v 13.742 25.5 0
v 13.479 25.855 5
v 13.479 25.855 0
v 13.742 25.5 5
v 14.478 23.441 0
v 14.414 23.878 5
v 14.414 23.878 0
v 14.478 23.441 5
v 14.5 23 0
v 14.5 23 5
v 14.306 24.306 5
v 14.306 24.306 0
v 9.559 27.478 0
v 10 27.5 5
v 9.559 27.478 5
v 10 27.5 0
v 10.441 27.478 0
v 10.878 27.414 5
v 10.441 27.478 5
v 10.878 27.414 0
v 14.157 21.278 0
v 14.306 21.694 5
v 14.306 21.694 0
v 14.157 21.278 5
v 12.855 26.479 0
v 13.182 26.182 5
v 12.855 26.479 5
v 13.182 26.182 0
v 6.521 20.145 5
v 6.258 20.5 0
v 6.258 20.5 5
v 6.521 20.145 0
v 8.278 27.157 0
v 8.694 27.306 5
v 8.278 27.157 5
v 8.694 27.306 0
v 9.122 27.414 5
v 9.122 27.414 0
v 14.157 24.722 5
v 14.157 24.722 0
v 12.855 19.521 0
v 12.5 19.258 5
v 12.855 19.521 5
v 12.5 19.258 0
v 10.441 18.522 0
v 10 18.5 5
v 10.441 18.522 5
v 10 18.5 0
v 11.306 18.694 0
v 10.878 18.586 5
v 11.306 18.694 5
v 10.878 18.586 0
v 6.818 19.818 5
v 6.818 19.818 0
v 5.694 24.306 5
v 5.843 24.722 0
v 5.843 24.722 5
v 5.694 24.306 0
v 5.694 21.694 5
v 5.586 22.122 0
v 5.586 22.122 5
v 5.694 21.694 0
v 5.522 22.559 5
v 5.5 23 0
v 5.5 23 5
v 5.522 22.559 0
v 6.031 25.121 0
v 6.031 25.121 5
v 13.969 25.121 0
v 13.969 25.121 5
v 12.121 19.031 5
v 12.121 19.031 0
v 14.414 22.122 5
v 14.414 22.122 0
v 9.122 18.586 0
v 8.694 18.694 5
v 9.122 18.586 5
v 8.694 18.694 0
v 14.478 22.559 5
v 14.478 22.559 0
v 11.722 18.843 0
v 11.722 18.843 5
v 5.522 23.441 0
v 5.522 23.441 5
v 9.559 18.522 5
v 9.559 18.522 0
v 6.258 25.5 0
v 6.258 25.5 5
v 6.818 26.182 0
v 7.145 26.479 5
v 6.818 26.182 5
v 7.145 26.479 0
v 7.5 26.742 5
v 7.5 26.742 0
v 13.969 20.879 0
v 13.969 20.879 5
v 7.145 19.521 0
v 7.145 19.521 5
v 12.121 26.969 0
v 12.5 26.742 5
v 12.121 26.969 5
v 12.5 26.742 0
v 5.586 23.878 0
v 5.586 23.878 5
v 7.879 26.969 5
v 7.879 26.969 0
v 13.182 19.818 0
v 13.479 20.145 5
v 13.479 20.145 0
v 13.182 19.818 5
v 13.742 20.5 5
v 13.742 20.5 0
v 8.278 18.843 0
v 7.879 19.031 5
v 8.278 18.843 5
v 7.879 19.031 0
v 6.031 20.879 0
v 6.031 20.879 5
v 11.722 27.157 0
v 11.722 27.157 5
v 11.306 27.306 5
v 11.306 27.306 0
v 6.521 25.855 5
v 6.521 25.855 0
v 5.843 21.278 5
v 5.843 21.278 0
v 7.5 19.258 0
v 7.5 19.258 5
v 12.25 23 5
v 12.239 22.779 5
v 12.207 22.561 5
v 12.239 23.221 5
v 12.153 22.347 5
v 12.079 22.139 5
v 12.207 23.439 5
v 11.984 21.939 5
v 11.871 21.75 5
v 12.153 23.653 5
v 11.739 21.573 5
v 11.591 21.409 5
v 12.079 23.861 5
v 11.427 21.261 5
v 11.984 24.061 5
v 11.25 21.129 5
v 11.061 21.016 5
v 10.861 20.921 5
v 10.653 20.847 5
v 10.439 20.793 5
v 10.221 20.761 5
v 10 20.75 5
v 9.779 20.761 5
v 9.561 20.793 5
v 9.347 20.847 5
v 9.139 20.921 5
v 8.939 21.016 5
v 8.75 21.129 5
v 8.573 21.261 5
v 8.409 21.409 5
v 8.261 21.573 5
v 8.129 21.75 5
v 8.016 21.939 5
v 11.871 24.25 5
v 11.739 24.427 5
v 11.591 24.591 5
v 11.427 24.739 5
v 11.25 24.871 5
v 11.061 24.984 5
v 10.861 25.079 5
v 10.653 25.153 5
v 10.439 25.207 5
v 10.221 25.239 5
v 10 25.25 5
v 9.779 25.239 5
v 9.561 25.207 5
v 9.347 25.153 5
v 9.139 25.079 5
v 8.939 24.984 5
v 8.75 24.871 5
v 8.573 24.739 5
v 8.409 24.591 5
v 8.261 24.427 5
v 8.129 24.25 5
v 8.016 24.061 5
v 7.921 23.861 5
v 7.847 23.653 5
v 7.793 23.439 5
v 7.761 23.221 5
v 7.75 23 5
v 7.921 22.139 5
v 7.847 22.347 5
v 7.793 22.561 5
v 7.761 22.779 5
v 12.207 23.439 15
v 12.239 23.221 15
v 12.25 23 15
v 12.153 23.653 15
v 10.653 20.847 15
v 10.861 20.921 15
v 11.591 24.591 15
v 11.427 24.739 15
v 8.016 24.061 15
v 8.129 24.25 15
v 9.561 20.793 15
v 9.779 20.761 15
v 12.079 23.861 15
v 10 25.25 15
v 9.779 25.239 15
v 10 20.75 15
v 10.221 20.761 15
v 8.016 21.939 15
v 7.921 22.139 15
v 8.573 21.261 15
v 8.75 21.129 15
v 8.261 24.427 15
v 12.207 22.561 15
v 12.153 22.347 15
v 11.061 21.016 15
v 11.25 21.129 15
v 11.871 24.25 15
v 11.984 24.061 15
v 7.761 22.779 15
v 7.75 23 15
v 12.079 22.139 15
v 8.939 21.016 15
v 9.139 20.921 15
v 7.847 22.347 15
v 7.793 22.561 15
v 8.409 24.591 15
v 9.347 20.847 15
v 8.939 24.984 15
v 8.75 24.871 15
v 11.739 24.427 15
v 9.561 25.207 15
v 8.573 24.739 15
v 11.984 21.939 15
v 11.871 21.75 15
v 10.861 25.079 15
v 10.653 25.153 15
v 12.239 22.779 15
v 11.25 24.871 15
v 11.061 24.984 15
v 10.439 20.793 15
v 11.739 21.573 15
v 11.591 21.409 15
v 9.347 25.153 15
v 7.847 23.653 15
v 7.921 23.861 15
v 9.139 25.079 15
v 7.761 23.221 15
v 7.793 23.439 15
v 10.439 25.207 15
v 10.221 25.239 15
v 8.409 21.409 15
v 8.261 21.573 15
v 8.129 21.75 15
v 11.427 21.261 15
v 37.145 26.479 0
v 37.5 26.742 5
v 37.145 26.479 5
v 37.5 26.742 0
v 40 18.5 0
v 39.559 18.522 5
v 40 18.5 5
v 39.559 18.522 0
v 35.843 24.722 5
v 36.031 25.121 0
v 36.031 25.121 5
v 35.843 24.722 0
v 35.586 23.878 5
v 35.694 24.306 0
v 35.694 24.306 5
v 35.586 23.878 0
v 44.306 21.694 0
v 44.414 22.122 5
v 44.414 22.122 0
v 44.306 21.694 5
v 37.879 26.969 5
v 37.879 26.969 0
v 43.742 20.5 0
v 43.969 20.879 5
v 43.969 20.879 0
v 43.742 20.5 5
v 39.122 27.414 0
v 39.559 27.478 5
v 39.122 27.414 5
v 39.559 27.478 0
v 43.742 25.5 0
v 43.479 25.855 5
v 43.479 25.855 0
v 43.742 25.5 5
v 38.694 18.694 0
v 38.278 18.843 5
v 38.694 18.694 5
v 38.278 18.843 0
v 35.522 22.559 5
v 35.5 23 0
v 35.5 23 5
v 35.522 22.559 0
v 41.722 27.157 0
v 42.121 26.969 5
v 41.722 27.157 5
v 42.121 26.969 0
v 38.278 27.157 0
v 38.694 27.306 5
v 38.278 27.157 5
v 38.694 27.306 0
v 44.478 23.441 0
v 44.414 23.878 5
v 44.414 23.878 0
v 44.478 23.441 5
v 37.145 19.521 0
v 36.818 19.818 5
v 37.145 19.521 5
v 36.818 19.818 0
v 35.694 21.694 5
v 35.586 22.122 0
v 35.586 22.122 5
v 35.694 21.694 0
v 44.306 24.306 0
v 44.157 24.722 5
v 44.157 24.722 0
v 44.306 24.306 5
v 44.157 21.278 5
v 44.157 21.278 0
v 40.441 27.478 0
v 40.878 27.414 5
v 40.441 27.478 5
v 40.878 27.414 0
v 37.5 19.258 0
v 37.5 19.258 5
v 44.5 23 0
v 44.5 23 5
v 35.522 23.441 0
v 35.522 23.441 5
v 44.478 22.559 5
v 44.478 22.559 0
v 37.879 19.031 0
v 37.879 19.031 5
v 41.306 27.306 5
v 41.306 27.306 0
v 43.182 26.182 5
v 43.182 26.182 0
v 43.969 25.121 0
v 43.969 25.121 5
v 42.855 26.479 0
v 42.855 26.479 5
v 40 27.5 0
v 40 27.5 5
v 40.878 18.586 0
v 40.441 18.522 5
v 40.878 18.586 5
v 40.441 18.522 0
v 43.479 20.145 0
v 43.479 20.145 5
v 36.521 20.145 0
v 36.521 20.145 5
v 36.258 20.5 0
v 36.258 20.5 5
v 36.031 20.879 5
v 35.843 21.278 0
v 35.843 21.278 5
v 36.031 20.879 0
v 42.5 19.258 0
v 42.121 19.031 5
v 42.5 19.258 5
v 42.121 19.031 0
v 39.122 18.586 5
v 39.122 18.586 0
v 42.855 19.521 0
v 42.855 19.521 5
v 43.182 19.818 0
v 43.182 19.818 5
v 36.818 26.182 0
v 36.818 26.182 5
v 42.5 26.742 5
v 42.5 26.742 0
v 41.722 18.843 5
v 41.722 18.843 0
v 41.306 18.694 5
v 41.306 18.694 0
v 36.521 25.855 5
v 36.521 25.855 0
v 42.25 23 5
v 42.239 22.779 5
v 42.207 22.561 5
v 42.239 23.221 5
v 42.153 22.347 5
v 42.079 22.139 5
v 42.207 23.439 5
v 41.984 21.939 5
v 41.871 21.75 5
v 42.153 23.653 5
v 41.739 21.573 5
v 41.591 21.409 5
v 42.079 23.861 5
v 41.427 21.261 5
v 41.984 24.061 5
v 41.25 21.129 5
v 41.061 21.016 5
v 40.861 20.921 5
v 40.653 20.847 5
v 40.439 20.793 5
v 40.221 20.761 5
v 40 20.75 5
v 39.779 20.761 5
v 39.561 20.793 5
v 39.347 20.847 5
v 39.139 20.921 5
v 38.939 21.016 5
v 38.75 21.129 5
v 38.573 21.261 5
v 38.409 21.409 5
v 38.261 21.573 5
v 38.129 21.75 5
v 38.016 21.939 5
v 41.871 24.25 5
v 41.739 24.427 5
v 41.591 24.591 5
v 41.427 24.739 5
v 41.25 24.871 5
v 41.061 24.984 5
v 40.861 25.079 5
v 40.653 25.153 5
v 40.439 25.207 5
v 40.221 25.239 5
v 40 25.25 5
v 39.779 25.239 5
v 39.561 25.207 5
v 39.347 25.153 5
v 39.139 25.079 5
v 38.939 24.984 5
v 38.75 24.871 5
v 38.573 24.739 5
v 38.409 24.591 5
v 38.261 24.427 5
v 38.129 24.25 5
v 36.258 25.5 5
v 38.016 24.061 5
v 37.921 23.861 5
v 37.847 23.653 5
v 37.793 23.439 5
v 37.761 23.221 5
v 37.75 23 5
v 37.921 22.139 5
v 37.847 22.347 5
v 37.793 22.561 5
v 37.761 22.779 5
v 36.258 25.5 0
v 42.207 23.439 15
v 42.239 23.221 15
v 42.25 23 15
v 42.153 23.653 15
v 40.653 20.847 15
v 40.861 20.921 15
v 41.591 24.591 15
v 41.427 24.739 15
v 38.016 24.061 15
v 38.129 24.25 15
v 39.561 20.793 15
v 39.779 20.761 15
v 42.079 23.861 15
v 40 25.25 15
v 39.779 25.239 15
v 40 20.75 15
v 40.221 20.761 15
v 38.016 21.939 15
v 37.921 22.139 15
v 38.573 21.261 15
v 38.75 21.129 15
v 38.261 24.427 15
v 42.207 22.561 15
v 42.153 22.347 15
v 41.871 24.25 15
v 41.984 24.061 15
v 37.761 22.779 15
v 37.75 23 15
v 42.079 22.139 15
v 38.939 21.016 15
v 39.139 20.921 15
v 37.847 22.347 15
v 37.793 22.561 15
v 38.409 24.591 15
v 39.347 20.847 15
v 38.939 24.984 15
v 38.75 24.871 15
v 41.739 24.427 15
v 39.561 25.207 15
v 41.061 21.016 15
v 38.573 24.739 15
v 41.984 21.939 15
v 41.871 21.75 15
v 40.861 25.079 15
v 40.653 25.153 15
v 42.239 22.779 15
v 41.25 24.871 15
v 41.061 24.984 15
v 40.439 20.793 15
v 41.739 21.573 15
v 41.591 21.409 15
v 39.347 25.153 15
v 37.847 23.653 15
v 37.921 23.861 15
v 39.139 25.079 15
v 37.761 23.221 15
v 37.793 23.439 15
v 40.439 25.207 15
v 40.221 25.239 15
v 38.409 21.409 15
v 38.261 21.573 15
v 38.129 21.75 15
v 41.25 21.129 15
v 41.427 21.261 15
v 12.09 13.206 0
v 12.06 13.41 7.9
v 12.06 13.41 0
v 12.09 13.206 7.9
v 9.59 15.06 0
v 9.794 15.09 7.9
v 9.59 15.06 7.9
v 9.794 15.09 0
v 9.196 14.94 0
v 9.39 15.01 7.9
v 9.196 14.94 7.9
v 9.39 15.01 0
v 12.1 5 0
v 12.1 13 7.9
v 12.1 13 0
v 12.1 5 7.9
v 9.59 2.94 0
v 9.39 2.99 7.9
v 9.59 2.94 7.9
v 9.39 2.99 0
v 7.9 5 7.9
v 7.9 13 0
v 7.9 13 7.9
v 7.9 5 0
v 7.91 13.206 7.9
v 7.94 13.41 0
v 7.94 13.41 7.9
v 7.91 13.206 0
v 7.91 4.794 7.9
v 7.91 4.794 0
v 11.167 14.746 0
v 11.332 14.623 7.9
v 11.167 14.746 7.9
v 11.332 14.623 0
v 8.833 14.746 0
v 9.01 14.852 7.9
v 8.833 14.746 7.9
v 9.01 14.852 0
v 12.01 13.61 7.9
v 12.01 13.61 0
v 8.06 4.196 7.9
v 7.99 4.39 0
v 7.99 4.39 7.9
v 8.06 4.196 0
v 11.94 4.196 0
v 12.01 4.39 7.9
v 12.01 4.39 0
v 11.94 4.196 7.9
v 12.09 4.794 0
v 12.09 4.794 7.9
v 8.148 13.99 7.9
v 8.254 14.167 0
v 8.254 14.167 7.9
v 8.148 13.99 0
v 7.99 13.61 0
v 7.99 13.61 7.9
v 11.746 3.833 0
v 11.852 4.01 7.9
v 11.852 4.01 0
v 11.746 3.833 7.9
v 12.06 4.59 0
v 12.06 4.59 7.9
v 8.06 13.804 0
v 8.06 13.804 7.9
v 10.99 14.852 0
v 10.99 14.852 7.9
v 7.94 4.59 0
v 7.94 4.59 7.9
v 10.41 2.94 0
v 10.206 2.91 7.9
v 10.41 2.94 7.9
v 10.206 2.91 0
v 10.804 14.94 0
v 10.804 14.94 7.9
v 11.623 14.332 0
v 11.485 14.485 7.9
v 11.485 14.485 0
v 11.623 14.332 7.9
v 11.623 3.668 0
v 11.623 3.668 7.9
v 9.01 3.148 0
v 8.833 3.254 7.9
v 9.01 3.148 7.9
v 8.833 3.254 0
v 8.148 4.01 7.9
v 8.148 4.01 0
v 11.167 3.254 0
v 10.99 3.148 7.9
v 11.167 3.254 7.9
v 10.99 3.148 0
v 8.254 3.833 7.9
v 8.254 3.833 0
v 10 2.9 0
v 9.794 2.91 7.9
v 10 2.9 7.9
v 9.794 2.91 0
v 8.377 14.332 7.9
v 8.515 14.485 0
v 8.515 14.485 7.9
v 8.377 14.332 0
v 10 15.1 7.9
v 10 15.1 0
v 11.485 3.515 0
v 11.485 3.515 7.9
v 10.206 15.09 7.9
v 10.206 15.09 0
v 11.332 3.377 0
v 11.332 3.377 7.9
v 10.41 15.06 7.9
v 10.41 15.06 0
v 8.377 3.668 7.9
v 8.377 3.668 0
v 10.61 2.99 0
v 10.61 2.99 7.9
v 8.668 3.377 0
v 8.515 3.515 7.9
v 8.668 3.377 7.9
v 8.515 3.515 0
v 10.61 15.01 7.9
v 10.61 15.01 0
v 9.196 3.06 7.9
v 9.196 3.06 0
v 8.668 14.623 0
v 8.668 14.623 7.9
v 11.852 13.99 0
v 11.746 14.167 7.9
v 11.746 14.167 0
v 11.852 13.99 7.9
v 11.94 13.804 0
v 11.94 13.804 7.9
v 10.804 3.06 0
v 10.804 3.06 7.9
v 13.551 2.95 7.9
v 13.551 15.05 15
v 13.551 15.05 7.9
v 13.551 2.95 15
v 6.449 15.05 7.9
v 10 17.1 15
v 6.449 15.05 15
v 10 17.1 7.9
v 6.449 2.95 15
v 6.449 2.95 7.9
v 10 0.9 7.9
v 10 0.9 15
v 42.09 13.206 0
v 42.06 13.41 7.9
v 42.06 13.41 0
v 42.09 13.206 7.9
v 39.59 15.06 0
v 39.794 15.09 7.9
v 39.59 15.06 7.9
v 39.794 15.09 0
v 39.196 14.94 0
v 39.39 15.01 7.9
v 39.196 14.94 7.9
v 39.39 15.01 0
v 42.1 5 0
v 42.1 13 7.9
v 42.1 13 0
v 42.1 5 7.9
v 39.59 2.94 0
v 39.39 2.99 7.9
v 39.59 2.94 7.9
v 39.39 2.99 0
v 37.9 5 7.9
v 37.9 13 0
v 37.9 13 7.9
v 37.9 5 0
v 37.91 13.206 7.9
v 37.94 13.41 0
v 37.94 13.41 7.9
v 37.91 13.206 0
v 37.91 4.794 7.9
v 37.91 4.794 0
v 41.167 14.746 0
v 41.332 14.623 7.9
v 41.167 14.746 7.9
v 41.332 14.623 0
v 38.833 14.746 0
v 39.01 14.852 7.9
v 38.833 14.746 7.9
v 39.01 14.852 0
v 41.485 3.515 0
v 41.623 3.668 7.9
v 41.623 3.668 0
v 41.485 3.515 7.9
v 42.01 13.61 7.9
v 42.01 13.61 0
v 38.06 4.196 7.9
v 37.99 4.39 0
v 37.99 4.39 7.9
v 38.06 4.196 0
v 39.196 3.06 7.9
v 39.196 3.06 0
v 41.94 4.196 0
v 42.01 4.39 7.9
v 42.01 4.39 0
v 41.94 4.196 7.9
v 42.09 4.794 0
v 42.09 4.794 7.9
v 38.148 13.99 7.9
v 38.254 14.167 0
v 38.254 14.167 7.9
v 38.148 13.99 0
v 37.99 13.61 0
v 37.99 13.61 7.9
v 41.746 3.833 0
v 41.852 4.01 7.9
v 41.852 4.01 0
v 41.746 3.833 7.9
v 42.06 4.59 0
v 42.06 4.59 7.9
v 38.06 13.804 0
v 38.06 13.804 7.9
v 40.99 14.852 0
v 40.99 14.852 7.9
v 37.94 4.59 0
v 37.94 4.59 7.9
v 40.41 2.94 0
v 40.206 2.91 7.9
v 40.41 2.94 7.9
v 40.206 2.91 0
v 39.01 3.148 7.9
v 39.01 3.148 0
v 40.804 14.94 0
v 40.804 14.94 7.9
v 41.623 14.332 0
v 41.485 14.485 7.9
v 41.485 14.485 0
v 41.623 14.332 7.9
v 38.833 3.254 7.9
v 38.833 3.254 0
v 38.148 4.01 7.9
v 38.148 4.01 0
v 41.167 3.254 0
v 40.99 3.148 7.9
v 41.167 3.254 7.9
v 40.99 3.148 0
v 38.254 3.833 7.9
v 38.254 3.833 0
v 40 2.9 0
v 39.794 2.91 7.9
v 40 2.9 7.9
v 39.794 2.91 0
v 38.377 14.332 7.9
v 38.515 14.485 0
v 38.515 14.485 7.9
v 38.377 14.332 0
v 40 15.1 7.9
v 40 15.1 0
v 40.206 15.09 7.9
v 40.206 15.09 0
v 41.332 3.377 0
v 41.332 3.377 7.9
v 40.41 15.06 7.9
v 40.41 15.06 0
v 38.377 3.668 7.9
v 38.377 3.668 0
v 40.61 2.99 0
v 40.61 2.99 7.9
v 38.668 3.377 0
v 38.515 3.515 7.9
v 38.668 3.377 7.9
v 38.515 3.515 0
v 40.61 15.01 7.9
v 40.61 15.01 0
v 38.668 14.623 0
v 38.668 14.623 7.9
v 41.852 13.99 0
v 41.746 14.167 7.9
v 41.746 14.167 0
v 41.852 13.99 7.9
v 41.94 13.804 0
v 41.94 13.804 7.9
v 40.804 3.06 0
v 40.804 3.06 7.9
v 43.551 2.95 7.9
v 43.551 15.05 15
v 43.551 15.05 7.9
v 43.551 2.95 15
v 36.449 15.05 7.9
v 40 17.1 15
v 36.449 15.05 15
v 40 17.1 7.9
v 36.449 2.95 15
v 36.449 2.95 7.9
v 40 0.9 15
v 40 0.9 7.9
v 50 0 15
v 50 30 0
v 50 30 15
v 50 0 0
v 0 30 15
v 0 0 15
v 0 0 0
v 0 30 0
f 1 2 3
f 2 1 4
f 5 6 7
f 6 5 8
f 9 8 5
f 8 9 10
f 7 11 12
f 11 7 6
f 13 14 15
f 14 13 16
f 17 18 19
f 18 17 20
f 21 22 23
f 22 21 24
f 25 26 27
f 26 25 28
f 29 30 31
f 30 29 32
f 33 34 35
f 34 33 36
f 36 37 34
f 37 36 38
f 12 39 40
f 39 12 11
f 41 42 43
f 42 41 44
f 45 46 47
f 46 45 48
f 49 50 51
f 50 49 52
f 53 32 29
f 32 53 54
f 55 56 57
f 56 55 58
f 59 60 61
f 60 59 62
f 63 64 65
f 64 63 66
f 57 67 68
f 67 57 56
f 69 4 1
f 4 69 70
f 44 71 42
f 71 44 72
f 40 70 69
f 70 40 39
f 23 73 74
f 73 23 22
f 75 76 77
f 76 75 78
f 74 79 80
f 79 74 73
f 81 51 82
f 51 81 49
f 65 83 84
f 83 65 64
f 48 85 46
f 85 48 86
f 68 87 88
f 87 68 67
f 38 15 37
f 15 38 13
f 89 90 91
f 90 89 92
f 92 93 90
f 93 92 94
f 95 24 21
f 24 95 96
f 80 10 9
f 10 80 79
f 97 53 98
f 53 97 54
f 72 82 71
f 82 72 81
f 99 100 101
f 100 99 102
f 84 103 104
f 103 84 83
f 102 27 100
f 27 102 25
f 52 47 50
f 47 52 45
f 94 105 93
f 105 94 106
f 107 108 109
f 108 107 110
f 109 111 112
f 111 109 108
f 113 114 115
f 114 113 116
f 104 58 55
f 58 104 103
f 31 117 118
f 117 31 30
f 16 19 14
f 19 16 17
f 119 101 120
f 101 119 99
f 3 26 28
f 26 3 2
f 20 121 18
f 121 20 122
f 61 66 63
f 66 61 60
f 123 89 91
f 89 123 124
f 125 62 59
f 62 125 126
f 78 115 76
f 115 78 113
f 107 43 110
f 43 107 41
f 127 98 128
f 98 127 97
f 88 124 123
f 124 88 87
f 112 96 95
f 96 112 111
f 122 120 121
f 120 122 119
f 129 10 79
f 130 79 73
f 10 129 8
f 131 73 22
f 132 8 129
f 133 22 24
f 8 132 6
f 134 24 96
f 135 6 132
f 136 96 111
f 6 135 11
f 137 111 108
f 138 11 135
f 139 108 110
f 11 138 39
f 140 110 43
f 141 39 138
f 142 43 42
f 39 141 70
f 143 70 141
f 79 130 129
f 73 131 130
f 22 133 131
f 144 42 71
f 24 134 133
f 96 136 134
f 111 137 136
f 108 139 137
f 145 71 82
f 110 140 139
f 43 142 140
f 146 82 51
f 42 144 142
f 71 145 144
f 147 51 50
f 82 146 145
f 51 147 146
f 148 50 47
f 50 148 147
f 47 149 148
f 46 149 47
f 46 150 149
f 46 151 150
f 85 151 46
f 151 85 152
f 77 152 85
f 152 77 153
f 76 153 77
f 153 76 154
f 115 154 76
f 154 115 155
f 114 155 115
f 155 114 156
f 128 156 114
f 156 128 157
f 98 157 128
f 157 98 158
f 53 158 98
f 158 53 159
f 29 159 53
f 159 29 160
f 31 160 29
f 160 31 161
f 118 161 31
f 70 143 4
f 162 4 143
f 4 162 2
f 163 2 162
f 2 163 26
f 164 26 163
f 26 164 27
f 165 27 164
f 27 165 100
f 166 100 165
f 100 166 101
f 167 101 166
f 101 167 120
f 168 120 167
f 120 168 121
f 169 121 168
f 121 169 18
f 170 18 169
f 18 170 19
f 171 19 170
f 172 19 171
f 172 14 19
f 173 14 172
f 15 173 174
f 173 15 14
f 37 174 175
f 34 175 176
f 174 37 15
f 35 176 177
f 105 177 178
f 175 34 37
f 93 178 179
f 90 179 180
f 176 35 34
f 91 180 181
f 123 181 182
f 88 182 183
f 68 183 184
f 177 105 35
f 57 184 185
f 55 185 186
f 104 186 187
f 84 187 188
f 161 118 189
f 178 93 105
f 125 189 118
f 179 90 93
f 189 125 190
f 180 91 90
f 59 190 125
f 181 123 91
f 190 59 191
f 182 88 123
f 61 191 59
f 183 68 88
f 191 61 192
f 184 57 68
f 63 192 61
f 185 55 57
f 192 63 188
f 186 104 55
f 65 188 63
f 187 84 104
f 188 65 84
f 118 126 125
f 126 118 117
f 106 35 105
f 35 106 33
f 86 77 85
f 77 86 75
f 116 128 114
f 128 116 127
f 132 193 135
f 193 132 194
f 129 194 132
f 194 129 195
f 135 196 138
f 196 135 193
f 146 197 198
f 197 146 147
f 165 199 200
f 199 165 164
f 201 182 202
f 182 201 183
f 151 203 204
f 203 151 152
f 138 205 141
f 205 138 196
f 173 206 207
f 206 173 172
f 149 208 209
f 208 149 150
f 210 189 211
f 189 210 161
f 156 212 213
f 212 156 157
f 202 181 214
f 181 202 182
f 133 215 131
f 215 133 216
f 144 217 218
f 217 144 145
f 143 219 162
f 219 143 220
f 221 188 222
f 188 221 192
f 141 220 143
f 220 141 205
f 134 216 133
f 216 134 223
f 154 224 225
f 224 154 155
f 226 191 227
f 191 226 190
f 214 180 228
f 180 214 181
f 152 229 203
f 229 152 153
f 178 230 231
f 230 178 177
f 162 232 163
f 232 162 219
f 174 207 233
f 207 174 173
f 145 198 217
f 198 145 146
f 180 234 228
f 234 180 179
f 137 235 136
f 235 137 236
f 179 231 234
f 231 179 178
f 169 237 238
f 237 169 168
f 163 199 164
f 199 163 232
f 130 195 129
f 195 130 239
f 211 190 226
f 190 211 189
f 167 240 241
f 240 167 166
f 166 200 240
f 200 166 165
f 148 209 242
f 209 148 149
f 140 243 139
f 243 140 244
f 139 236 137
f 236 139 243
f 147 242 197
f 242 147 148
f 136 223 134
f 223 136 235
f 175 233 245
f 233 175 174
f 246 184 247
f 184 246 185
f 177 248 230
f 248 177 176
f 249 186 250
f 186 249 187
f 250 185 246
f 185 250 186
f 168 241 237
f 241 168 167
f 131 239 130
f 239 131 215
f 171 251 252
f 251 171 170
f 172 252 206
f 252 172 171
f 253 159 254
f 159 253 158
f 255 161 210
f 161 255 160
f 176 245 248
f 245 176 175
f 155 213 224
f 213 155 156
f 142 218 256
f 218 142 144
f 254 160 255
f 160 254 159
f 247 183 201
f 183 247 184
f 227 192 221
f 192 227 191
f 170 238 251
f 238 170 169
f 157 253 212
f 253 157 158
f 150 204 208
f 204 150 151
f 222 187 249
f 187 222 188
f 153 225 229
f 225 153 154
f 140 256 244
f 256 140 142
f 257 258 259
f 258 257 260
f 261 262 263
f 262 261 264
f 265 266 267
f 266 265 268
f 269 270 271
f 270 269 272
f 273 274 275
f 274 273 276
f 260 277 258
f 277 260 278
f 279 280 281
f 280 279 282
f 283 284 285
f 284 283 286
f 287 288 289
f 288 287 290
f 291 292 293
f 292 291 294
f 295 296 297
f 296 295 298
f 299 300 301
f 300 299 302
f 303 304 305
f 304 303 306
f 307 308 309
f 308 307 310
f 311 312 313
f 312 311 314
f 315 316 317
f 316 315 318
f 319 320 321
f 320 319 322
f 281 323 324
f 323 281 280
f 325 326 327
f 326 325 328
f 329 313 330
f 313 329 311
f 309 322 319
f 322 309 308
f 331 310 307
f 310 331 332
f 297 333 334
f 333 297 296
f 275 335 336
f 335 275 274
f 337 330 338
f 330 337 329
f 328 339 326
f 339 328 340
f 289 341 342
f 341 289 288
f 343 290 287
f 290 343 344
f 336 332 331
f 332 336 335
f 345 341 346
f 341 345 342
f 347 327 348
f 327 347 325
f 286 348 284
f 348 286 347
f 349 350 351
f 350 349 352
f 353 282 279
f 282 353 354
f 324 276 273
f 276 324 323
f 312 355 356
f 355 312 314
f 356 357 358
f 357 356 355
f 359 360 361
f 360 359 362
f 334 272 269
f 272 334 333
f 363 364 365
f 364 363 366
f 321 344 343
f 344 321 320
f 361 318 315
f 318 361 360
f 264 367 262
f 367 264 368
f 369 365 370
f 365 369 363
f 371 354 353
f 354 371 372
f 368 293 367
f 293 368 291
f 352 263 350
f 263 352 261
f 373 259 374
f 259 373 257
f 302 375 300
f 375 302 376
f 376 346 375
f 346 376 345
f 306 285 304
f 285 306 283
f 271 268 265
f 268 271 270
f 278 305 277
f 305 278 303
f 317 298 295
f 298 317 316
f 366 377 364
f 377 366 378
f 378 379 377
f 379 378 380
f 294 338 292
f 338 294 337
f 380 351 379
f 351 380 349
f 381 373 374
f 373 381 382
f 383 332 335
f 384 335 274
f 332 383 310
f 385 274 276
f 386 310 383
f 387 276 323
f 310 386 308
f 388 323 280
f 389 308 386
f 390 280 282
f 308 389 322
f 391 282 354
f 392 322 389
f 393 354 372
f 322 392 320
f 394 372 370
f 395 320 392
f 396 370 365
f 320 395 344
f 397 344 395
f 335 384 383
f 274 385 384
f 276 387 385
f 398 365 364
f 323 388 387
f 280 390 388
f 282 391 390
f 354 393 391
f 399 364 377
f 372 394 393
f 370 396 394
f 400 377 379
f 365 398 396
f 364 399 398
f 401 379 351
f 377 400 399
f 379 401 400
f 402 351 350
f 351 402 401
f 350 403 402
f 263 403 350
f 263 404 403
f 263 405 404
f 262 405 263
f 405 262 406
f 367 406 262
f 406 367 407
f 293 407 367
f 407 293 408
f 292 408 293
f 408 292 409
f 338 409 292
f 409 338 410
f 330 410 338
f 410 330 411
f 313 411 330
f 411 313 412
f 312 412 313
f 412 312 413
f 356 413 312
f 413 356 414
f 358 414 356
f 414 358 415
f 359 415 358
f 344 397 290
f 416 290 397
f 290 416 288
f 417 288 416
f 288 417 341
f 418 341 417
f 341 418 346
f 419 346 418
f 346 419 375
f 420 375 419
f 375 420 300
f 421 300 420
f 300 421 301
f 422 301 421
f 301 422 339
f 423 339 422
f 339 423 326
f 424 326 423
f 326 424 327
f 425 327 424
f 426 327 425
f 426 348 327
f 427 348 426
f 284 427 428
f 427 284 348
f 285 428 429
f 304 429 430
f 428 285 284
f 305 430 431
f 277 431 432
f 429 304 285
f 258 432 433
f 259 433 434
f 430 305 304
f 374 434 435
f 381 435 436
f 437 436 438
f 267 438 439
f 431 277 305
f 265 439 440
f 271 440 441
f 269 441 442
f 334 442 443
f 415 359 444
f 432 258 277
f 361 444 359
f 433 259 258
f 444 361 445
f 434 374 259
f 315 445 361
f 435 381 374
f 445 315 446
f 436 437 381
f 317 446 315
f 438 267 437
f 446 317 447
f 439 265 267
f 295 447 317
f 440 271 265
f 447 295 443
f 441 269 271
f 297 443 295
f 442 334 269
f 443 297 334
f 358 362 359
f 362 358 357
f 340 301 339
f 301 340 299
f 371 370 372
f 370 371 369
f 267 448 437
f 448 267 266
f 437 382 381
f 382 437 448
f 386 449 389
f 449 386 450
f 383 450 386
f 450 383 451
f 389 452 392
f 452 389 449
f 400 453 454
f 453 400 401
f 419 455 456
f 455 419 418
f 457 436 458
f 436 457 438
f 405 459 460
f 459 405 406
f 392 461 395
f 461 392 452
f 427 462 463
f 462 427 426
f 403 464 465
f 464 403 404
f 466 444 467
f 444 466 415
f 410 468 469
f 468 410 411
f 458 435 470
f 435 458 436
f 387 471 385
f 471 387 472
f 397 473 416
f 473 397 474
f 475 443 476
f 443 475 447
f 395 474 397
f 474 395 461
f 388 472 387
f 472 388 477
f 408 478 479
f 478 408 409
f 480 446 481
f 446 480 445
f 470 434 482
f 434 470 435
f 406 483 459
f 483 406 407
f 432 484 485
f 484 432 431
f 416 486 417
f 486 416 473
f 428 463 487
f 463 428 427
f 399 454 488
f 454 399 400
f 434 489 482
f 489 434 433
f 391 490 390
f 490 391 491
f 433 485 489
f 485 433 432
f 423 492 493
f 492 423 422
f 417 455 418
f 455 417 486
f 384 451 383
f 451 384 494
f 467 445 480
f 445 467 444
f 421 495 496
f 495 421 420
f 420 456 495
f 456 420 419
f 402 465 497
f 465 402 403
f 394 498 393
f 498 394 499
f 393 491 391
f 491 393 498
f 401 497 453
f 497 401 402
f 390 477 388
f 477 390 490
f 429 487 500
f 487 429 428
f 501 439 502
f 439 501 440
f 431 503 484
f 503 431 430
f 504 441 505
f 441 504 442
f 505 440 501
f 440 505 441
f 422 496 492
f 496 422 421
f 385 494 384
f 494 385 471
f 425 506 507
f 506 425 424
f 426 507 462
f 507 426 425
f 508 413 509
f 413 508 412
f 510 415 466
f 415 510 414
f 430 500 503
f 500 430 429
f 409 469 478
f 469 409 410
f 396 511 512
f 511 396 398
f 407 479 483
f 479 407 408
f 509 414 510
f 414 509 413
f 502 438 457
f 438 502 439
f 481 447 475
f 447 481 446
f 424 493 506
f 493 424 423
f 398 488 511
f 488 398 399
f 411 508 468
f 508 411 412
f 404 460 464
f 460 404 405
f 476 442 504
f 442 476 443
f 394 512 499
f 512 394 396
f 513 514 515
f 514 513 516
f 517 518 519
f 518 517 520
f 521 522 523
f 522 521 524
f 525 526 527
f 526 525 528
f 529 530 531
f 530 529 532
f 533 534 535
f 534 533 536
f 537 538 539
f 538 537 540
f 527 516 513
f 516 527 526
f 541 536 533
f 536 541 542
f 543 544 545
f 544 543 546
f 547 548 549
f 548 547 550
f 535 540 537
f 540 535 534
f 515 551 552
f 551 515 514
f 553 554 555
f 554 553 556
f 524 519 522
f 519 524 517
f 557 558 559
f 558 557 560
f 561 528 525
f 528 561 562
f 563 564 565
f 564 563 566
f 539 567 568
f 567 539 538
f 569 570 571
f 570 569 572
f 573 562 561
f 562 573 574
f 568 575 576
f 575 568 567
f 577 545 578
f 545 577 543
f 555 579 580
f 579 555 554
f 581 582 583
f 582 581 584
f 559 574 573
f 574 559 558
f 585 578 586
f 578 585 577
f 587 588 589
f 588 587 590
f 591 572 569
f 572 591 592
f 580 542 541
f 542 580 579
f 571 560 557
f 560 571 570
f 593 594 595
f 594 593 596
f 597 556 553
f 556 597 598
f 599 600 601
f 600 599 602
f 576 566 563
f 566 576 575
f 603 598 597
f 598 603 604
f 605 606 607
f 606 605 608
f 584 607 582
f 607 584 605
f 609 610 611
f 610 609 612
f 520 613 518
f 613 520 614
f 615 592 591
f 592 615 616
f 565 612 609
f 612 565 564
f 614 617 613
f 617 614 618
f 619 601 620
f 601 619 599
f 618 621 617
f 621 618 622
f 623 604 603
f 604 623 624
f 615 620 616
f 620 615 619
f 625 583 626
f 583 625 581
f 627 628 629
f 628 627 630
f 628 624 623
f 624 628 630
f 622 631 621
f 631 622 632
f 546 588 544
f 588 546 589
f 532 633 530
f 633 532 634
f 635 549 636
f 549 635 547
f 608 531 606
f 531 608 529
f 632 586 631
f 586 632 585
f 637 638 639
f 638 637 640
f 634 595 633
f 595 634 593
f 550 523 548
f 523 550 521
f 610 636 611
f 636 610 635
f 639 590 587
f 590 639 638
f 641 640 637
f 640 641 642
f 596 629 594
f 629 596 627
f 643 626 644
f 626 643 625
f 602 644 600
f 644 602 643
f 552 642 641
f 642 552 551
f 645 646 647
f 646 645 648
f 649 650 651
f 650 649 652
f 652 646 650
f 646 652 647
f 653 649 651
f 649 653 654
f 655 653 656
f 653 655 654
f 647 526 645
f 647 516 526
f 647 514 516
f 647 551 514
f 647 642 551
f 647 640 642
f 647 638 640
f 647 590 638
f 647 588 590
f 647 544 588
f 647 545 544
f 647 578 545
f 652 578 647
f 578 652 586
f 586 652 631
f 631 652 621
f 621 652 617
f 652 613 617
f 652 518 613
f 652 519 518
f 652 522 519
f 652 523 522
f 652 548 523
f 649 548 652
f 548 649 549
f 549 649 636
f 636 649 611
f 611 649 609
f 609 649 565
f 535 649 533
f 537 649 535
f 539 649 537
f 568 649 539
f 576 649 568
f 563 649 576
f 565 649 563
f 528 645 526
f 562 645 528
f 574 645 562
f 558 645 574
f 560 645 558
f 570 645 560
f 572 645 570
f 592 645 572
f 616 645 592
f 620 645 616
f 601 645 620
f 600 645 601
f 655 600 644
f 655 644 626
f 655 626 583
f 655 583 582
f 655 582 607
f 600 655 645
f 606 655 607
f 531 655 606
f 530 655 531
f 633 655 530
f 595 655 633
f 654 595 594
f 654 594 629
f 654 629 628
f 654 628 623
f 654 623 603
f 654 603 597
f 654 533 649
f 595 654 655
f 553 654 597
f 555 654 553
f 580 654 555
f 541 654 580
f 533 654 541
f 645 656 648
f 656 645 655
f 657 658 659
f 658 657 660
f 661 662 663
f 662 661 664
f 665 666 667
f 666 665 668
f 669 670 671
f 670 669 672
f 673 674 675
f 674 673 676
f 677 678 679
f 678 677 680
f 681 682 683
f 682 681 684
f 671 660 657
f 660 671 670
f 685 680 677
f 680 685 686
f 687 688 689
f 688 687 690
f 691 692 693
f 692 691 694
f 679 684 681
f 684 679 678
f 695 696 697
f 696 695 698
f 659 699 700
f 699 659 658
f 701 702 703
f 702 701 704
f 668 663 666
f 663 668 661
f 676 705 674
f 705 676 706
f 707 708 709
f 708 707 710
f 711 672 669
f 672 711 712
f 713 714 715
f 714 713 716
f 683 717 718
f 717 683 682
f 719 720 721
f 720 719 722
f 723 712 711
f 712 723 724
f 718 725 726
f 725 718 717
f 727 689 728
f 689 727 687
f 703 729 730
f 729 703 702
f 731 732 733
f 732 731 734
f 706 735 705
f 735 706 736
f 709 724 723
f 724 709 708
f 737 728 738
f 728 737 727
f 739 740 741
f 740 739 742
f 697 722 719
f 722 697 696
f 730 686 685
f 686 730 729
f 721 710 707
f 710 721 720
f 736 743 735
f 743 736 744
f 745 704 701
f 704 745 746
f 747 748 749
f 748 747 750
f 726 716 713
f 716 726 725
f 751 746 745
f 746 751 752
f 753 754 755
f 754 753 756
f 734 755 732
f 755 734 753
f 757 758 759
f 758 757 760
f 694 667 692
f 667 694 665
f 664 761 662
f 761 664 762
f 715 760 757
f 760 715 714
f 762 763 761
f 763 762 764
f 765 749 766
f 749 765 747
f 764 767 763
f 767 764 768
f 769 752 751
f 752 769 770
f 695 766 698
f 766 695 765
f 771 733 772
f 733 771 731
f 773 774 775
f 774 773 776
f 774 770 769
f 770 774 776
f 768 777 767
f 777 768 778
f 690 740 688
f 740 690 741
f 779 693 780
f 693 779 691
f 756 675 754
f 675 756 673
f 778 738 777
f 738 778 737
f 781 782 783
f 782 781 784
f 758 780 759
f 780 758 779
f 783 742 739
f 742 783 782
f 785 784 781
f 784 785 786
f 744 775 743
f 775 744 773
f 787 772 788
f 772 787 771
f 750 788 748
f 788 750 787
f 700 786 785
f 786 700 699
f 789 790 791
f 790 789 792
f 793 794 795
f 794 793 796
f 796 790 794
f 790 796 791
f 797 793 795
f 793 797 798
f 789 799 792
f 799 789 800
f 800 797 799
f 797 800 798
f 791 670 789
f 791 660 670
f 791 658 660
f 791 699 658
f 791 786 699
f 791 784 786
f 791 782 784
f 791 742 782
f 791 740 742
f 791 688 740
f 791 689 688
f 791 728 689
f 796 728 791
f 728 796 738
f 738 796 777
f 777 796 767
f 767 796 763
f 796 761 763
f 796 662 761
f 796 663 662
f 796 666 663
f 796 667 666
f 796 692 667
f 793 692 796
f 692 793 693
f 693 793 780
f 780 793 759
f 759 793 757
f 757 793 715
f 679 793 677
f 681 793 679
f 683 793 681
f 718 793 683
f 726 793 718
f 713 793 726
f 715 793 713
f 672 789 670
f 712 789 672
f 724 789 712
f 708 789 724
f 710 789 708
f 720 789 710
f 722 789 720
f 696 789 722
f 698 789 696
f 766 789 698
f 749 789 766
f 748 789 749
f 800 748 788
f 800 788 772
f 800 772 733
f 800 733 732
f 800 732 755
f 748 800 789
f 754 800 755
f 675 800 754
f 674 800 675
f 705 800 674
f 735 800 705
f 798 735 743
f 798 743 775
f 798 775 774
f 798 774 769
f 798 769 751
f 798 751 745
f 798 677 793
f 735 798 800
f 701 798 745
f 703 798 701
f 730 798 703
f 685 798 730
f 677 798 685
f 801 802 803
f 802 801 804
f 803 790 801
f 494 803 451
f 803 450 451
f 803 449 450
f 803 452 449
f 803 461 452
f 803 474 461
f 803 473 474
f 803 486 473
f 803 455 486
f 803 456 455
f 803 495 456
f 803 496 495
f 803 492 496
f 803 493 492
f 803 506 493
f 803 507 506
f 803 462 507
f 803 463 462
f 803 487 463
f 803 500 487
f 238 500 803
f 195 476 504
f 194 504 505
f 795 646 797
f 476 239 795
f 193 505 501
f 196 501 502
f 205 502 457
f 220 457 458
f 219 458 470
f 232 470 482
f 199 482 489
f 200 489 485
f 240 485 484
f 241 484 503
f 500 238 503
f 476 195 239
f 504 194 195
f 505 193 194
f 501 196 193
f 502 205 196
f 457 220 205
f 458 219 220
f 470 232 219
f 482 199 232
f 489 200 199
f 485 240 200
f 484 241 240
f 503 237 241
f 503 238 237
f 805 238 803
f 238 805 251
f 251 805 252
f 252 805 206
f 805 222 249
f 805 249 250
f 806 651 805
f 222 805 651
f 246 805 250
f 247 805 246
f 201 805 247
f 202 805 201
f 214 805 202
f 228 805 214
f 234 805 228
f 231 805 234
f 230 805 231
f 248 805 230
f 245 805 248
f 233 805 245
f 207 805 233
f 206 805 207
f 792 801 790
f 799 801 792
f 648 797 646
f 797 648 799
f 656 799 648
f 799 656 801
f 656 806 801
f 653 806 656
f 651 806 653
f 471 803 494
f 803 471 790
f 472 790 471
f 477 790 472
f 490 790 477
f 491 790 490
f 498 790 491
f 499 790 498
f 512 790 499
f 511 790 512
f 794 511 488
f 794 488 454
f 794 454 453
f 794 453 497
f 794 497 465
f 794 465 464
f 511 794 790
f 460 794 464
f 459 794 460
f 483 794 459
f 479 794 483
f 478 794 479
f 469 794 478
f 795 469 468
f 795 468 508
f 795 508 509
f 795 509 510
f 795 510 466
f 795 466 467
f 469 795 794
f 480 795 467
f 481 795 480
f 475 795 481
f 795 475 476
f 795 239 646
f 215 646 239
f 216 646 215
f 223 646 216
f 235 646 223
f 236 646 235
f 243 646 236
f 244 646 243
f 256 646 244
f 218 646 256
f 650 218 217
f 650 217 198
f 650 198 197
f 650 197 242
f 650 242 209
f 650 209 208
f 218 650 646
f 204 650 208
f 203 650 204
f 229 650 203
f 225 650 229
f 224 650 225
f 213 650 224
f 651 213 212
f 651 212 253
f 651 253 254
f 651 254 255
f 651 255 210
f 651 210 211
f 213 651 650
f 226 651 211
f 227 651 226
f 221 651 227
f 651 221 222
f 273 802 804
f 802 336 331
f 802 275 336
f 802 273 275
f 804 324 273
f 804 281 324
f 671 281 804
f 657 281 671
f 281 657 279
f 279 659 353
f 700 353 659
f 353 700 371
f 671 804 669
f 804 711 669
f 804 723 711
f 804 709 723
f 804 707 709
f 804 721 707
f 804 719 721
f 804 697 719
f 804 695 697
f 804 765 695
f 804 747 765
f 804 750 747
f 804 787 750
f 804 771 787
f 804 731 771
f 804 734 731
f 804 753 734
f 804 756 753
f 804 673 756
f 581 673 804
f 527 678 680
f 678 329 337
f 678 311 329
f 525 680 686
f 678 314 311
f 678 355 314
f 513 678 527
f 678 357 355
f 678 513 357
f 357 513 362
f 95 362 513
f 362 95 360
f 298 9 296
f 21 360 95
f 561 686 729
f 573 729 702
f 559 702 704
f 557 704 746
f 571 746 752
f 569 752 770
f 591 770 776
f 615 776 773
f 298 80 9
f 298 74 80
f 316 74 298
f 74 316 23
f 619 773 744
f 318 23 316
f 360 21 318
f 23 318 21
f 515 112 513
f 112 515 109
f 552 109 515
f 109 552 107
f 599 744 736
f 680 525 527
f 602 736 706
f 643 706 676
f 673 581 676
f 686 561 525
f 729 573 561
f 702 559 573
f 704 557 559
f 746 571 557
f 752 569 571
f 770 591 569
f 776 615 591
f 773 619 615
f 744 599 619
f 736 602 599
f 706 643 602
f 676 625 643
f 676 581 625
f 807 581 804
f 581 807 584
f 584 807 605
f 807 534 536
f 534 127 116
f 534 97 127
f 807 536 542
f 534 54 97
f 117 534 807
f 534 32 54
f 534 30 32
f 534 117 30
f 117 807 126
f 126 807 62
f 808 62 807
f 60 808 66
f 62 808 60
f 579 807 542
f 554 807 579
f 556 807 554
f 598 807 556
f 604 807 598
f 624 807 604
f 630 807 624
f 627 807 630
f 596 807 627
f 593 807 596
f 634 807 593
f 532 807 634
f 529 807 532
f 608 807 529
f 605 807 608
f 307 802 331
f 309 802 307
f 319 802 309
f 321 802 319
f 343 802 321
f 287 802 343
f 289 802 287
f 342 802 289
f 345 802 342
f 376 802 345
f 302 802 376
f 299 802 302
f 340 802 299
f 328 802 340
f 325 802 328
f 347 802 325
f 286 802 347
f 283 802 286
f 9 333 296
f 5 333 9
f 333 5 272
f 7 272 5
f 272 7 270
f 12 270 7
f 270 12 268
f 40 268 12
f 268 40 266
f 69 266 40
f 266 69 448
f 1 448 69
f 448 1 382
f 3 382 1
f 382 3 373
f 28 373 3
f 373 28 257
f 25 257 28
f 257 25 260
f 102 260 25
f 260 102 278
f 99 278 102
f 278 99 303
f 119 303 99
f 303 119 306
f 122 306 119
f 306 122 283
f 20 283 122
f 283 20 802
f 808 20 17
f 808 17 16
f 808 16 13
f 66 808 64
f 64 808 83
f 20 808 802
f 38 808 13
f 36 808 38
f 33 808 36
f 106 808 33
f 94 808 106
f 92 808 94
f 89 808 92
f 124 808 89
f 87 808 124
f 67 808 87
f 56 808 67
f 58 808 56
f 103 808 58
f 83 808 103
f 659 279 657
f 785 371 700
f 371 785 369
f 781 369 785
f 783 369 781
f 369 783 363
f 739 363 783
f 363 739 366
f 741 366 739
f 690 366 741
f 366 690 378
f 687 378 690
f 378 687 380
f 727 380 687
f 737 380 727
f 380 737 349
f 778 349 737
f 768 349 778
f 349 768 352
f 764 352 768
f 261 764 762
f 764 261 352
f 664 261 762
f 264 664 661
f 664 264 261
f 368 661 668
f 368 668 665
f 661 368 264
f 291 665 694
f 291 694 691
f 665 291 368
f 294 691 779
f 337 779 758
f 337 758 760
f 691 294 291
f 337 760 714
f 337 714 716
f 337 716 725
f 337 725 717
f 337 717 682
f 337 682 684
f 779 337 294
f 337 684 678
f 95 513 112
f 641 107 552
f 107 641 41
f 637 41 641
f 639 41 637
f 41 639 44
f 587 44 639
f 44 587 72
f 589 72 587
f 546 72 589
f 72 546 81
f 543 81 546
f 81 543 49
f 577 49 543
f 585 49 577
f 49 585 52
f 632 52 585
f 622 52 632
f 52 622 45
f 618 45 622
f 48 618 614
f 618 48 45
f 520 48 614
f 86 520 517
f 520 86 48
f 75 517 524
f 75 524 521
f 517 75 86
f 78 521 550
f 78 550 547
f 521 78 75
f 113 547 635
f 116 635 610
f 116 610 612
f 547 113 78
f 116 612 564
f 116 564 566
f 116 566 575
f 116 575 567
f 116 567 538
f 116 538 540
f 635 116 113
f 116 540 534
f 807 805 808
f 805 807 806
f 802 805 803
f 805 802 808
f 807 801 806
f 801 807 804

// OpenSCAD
$fn=64;
LEN=30;
DIST=30;
WIDTH=50;

module screw() {
    translate([0,0,-0.1]) {
        cylinder(d=9,h=5.1);
    }
    translate([0,0,4.9]){
        cylinder(d=4.5,h=10.2);
    }
}

module hole() {
    
}

module slot(length) {
    hull(){
        translate([0,0,-0.1]) {
            cylinder(d=4.2,h=8.1);
        }
        translate([0,length,0]) {
            translate([0,0,-0.1]) {
                cylinder(d=4.2,h=8.1);
            }
        }
    }
    hull(){
        translate([0,0,7.9]){
            rotate([0,0,30]){
                cylinder(d=8.2,h=7.2,$fn=6);
            }
        }
        translate([0,length,0]) {
            translate([0,0,7.9]){
                rotate([0,0,30]) {
                    cylinder(d=8.2,h=7.2,$fn=6);
                }
            }
        }
    }
}

module cutout_slot(){
    slot(LEN-22);
    translate([DIST,0,0]) {
        slot(LEN-22);
    }
}

module cutout_screw() {
    screw();
    translate([DIST,0,0]) {
        screw();
    }
}
module adapterplate() {
    width=((WIDTH-20)<DIST)?(DIST+20):WIDTH;

    difference(){
        cube([width,LEN,15]);
        union(){
            translate([((width-DIST) / 2.0), LEN-7,0]){
                cutout_screw();
            }
            translate([((width-DIST)/2.0) ,5,0]){
                cutout_slot();
            }
        }
    }
    
}

adapterplate();
